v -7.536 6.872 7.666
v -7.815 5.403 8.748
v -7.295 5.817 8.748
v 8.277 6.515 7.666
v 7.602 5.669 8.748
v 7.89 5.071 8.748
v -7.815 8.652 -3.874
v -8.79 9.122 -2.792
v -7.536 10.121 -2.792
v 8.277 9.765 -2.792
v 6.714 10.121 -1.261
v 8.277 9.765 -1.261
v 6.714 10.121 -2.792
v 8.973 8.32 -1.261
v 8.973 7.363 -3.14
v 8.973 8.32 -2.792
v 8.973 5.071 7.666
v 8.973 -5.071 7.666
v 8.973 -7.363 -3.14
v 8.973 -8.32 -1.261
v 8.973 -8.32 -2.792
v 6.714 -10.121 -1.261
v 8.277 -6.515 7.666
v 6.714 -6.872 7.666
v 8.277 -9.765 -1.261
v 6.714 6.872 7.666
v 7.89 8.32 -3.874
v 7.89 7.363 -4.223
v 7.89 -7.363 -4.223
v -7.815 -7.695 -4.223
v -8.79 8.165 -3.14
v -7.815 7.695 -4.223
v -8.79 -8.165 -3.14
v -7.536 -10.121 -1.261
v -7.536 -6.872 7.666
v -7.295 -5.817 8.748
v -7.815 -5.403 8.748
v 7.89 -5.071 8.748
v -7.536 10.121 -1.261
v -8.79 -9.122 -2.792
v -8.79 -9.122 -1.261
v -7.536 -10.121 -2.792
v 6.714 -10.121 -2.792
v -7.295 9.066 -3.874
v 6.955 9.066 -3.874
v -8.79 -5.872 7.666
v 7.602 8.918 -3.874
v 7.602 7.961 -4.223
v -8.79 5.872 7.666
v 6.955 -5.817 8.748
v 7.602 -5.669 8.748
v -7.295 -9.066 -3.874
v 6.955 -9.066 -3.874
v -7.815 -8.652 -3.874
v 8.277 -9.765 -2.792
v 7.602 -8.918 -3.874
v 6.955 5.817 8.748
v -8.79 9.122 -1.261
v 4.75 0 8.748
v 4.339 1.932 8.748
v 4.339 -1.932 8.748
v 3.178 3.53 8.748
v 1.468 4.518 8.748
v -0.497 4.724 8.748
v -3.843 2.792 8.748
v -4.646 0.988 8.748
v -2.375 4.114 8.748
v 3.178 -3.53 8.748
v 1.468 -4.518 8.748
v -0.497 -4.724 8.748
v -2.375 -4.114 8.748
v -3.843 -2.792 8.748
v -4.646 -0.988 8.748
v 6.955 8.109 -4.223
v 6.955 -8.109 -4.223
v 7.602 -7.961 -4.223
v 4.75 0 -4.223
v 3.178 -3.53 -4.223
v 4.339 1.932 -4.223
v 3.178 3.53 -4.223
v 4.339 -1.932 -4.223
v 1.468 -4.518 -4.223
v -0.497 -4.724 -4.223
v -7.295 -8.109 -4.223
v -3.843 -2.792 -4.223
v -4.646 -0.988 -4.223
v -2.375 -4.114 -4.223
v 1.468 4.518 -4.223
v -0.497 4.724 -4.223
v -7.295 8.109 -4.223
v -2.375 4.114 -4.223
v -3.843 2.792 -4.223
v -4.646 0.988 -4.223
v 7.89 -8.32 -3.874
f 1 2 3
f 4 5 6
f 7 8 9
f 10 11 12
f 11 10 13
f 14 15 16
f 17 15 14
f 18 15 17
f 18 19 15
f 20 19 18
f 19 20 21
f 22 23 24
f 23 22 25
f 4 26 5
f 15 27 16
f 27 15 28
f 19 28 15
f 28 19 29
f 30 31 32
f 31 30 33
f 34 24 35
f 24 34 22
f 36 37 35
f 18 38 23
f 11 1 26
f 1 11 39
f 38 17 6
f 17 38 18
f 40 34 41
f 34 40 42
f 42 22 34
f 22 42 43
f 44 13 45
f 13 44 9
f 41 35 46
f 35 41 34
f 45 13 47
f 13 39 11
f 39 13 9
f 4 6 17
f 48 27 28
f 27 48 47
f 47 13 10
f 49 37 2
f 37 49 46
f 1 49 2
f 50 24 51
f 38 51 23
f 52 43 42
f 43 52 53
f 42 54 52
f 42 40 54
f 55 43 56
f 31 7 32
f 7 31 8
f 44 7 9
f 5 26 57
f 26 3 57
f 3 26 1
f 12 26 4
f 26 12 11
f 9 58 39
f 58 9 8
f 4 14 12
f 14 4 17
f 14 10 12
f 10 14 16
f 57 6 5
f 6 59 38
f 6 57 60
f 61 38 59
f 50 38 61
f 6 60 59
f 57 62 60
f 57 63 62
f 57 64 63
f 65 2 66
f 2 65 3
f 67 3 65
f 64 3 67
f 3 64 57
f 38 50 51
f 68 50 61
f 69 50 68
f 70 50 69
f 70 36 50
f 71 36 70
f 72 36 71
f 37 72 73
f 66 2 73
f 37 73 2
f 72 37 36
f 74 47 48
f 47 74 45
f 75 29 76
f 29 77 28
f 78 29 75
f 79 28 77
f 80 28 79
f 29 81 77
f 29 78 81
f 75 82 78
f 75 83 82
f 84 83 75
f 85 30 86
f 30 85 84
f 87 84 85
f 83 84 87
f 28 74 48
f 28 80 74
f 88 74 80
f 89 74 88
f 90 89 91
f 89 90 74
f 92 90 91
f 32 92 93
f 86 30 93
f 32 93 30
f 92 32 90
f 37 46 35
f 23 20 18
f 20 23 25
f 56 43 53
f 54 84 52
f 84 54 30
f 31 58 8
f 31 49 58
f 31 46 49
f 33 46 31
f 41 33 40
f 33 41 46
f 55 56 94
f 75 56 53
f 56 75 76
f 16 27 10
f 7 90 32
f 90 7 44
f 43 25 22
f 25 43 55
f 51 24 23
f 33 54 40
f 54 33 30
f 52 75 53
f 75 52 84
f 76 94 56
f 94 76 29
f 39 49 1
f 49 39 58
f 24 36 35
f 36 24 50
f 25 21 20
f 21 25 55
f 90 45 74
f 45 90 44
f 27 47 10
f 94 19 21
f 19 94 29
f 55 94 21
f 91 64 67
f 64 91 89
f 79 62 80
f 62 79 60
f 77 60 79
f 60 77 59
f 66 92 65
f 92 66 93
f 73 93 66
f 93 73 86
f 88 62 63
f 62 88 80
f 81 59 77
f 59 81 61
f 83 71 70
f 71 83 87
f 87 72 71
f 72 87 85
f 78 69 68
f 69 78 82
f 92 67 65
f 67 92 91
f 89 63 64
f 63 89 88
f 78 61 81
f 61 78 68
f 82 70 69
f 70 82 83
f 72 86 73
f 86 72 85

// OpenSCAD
RodDiameter = 9.5; 


difference()
{
	minkowski()
	{
		hull()
		{
			difference()
			{
				union()
				{
					// This is for one side, adjust the a=20 to do a different angle
					rotate(a=20, v=[1,0,0]) translate ([0,RodDiameter/2,0]) cube([RodDiameter*1.5,RodDiameter/2,RodDiameter], center=true);
					// This is for the other side, adjust the a=-20 to do a different angle
					rotate(a=-20, v=[1,0,0]) translate ([0,-RodDiameter/2,0]) cube([RodDiameter*1.5,RodDiameter/2,RodDiameter], center=true);
				}
				translate([0,0,-RodDiameter*1.25]) cube(RodDiameter*2, RodDiameter*2, RodDiameter*2, center=true);
			}
	
		}
	 sphere(r=2);
	}
cylinder (r=RodDiameter/2, h = 100, center=true);
}
